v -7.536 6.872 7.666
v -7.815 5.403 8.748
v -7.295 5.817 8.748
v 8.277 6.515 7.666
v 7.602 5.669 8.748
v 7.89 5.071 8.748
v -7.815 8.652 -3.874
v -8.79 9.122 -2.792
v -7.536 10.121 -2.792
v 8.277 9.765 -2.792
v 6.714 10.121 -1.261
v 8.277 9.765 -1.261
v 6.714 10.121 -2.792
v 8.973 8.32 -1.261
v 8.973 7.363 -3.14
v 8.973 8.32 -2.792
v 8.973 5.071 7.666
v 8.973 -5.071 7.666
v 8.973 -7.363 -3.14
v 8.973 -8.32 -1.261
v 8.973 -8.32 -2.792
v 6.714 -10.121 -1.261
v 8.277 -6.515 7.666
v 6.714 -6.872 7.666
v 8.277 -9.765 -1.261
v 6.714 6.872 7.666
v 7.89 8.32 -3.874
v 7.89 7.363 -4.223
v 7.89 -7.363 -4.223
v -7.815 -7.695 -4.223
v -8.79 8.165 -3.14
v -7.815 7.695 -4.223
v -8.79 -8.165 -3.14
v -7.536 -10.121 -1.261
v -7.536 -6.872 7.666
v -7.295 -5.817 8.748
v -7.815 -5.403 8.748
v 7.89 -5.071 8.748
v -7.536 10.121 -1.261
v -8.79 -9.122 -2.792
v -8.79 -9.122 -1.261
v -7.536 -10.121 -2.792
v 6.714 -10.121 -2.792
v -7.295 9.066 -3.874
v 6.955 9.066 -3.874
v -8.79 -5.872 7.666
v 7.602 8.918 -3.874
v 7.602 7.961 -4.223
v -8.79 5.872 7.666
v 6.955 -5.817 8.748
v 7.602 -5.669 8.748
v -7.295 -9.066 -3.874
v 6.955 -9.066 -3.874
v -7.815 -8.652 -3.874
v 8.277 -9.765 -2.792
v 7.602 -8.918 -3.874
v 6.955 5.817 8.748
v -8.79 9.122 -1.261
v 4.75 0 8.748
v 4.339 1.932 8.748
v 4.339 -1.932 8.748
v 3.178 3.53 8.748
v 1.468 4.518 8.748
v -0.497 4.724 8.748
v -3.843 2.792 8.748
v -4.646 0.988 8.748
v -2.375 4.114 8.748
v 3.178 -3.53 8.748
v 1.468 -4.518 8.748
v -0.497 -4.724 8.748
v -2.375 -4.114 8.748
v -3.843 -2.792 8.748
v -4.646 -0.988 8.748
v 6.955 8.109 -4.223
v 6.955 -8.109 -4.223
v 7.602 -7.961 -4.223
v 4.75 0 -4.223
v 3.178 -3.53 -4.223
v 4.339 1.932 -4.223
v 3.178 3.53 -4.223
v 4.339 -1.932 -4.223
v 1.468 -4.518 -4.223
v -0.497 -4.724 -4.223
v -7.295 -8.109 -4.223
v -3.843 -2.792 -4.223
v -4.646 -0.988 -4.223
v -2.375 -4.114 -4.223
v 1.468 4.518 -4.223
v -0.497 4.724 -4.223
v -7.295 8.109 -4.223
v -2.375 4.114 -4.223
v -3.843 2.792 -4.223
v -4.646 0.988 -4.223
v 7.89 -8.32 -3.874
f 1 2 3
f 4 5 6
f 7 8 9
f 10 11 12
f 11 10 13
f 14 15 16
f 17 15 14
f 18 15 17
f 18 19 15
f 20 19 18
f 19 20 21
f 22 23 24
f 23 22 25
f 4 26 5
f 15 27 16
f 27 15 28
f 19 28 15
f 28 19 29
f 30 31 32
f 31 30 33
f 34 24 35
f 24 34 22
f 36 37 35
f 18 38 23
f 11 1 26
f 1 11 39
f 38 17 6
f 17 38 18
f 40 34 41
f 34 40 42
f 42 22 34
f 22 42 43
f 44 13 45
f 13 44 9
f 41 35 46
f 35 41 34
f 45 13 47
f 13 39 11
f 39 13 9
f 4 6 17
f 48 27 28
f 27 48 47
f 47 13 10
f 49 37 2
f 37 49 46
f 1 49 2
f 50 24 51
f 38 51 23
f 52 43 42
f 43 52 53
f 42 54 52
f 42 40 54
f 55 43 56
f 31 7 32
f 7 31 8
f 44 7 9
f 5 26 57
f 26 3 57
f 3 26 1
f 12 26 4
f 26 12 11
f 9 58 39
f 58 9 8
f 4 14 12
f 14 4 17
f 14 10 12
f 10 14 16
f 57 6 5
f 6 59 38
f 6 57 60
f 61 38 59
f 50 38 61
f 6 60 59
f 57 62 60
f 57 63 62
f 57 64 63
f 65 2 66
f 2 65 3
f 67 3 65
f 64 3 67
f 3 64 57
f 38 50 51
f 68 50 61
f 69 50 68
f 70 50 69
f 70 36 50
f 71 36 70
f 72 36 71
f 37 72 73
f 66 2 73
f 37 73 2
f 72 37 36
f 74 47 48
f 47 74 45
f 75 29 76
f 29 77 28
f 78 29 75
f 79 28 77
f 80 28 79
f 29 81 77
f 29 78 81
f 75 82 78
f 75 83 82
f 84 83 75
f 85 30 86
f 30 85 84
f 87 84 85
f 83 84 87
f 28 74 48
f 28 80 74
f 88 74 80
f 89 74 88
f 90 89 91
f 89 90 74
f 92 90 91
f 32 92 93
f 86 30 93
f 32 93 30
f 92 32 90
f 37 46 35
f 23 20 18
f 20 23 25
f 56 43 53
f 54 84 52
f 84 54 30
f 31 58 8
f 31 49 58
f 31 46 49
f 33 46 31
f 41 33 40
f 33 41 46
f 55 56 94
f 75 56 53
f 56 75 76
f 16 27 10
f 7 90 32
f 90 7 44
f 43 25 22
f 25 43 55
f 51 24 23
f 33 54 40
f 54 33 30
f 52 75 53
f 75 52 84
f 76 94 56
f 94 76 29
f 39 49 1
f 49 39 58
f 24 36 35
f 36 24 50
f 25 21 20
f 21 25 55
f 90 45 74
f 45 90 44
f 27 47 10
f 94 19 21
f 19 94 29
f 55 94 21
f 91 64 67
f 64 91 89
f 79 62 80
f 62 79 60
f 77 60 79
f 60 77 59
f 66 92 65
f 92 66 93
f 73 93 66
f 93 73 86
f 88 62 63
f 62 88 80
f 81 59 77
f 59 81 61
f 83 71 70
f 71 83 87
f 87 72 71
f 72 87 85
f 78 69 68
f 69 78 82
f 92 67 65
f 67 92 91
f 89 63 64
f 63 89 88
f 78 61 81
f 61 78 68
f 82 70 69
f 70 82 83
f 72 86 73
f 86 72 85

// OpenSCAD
RodDiameter = 9.5; 


difference()
{
	minkowski()
	{
		hull()
		{
			difference()
			{
				union()
				{
					// This is for one side, adjust the a=20 to do a different angle
					rotate(a=20, v=[1,0,0]) translate ([0,RodDiameter/2,0]) cube([RodDiameter*1.5,RodDiameter/2,RodDiameter], center=true);
					// This is for the other side, adjust the a=-20 to do a different angle
					rotate(a=-20, v=[1,0,0]) translate ([0,-RodDiameter/2,0]) cube([RodDiameter*1.5,RodDiameter/2,RodDiameter], center=true);
				}
				translate([0,0,-RodDiameter*1.25]) cube(RodDiameter*2, RodDiameter*2, RodDiameter*2, center=true);
			}
	
		}
	 sphere(r=2);
	}
cylinder (r=RodDiameter/2, h = 100, center=true);
}
